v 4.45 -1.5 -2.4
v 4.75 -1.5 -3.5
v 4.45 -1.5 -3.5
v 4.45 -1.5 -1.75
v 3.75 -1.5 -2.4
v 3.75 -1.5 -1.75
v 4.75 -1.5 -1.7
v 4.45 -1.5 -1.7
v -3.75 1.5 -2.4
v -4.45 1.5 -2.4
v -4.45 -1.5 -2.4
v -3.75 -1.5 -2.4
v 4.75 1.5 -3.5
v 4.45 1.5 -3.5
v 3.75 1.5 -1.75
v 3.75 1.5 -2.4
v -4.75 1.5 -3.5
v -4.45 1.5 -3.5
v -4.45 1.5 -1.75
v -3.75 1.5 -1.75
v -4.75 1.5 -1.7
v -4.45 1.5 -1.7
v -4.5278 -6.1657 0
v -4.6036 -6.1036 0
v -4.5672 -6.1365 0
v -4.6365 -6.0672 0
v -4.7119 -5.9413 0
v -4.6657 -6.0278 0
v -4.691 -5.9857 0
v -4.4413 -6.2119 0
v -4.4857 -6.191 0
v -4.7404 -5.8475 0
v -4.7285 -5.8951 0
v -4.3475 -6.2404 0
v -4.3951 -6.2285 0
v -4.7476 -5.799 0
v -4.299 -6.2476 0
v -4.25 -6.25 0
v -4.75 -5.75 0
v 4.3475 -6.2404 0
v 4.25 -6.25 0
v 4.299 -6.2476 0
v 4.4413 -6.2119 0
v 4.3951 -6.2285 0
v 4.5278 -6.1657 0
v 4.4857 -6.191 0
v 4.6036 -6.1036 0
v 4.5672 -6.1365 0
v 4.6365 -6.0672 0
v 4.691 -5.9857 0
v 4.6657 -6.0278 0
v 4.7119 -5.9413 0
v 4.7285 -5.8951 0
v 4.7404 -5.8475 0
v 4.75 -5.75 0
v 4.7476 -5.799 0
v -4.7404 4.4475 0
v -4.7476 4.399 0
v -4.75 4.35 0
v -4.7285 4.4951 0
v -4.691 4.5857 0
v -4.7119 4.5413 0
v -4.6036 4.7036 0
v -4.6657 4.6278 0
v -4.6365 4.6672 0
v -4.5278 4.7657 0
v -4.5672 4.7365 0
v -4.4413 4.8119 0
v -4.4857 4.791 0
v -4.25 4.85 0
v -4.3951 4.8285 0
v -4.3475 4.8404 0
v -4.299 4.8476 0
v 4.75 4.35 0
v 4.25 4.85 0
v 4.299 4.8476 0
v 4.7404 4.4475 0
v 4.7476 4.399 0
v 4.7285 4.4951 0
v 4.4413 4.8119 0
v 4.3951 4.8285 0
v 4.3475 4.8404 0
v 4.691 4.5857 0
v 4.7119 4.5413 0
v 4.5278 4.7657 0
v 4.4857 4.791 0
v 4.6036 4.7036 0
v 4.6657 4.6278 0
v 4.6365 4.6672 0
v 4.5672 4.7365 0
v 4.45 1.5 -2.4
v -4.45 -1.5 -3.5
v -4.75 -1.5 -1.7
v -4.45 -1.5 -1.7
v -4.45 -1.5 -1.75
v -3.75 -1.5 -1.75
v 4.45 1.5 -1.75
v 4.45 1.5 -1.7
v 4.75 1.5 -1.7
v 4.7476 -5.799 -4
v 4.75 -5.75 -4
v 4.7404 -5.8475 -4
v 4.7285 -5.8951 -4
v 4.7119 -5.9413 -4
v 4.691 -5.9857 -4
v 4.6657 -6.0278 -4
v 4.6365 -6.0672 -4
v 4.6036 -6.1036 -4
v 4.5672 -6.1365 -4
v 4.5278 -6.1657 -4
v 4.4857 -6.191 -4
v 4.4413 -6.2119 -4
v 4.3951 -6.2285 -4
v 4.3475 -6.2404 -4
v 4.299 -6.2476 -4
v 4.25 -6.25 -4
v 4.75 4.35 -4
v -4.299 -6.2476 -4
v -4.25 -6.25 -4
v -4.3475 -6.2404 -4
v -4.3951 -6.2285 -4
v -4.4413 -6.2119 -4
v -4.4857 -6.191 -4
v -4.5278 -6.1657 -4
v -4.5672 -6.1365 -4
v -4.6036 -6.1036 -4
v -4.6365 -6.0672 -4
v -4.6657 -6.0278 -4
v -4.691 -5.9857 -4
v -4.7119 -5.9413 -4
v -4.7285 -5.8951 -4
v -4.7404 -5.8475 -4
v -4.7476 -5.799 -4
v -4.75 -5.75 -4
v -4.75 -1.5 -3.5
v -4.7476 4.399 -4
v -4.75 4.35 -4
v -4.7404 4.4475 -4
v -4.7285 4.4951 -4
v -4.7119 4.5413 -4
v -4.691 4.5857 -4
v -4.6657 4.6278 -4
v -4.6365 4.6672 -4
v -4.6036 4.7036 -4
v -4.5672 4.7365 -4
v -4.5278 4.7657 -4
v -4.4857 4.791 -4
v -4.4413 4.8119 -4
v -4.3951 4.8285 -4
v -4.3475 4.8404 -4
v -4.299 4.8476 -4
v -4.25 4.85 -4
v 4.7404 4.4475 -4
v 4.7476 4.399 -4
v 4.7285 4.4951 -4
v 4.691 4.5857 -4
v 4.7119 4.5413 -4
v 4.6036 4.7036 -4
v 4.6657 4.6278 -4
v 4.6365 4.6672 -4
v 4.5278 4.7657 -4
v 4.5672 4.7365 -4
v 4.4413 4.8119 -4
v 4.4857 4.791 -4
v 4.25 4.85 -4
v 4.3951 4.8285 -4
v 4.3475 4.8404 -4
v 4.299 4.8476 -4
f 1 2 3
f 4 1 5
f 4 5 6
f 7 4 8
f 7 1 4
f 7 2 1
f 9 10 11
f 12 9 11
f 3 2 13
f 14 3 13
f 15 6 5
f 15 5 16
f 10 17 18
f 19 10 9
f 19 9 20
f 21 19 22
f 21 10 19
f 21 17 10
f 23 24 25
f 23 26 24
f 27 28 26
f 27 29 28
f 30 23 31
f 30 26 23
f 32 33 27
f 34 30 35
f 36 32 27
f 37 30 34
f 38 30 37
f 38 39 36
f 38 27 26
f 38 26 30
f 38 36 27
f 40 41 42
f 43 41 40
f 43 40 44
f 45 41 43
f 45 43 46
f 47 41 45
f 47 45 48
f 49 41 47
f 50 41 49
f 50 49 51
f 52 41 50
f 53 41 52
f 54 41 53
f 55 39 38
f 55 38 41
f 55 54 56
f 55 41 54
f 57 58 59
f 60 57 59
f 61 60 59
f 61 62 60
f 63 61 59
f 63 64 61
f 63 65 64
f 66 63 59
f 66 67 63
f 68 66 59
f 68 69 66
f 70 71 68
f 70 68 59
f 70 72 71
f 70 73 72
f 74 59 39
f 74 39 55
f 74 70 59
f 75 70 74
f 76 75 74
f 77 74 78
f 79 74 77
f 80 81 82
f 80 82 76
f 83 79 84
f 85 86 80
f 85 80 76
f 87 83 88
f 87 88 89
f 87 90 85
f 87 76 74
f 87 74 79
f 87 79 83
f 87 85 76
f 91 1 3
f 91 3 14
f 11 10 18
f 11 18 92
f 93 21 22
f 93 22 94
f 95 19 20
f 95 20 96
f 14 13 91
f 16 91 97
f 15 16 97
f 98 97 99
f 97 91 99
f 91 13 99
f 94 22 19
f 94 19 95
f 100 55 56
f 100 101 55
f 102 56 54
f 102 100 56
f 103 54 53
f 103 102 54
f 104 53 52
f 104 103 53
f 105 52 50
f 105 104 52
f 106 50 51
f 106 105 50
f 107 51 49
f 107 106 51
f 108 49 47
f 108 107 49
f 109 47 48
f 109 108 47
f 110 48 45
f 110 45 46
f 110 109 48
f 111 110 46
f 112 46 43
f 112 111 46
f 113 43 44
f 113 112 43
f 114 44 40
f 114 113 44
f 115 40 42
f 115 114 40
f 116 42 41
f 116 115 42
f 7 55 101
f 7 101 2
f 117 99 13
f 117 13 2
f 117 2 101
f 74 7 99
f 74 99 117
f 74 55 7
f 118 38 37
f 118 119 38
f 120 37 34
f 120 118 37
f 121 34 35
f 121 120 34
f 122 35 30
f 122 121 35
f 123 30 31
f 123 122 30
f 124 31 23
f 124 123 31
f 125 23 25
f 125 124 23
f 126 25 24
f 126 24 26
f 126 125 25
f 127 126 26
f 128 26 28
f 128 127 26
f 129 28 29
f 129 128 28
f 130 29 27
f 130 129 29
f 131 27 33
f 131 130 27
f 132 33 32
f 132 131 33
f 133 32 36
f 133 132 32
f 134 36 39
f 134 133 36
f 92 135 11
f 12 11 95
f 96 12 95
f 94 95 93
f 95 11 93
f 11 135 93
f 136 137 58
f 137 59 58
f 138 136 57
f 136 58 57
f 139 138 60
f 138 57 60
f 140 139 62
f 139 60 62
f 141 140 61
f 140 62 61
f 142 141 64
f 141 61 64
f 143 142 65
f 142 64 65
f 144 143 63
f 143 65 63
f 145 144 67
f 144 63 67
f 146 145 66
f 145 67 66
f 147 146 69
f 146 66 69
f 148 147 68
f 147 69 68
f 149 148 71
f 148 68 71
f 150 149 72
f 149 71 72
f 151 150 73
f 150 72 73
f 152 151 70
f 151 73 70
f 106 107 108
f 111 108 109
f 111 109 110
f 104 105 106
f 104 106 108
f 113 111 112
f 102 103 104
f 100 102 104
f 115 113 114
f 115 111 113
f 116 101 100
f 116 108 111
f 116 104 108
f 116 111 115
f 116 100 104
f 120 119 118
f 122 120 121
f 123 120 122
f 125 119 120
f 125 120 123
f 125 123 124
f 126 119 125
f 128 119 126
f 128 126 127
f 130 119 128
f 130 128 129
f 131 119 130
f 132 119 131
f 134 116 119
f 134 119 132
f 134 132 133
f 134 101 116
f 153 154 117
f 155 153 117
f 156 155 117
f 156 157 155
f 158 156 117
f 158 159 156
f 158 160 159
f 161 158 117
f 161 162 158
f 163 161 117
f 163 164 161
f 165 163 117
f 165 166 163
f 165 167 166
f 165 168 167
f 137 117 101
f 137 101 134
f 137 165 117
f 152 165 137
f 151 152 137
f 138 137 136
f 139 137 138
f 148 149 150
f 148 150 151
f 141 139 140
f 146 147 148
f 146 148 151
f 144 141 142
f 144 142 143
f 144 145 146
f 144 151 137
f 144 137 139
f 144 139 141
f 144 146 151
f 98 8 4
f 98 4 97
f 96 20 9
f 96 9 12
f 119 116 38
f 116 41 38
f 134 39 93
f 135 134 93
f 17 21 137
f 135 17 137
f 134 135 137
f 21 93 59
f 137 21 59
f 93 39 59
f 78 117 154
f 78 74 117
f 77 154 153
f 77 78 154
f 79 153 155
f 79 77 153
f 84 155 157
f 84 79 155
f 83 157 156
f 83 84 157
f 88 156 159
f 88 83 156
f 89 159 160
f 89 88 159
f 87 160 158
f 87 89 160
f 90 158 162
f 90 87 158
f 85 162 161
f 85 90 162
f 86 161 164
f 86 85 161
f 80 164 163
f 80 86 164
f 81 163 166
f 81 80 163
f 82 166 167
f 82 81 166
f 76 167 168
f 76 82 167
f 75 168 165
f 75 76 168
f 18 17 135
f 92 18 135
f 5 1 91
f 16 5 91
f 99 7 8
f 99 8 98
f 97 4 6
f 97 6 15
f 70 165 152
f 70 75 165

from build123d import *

# Parameters (mm, degrees)
SKETCH006_W     = 9.5
SKETCH006_H     = 11.1
PAD004_DEPTH    = 3.5
SKETCH013_W     = 3
SKETCH013_H     = 0.65
POCKET005_DEPTH = 1
SKETCH014_W     = 9.5
SKETCH014_H     = 11.1
PAD007_DEPTH    = 0.5
FILLET007_R     = 0.5
SKETCH019_W     = 3
SKETCH019_H     = 0.65
POCKET006_DEPTH = 1
SKETCH020_W     = 3
SKETCH020_H     = 1.8
POCKET007_DEPTH = 0.3
SKETCH021_W     = 3
SKETCH021_H     = 1.8
POCKET008_DEPTH = 0.3


with BuildPart() as part:
    # Sketch006 → Pad004 (new body)
    with BuildSketch(Plane.XY):
        with Locations((0, -0.7)):
            Rectangle(SKETCH006_W, SKETCH006_H)
    extrude(amount=-PAD004_DEPTH)

    # Sketch013 (on Face4 of Pad004) → Pocket005 (cut)
    with BuildSketch(Plane.YZ.offset(4.75)):
        with Locations((0, -2.075)):
            Rectangle(SKETCH013_W, SKETCH013_H)
    extrude(amount=-POCKET005_DEPTH, mode=Mode.SUBTRACT)

    # Sketch014 (on Face5 of Pocket005) → Pad007 (join)
    with BuildSketch(Plane(origin=(0, 0, -3.5), x_dir=(-1, 0, 0), z_dir=(0, 0, -1))):
        with Locations((0, -0.7)):
            Rectangle(SKETCH014_W, SKETCH014_H)
    extrude(amount=PAD007_DEPTH)

    # Fillet007
    fillet007_edges = [part.edges().sort_by_distance(p)[0] for p in [
        (4.75, -6.25, -3.75),
        (-4.75, -6.25, -3.75),
        (4.75, 4.85, -3.75),
        (-4.75, 4.85, -3.75),
    ]]
    fillet(fillet007_edges, radius=FILLET007_R)

    # Sketch019 (on Face7 of Fillet007) → Pocket006 (cut)
    with BuildSketch(Plane(origin=(-4.75, 0, 0), x_dir=(0, -1, 0), z_dir=(-1, 0, 0))):
        with Locations((0, -2.075)):
            Rectangle(SKETCH019_W, SKETCH019_H)
    extrude(amount=-POCKET006_DEPTH, mode=Mode.SUBTRACT)

    # Sketch020 (on Face6 of Pocket006) → Pocket007 (cut)
    with BuildSketch(Plane.YZ.offset(4.75)):
        with Locations((0, -2.6)):
            Rectangle(SKETCH020_W, SKETCH020_H)
    extrude(amount=-POCKET007_DEPTH, mode=Mode.SUBTRACT)

    # Sketch021 (on Face7 of Pocket007) → Pocket008 (cut)
    with BuildSketch(Plane(origin=(-4.75, 0, 0), x_dir=(0, -1, 0), z_dir=(-1, 0, 0))):
        with Locations((0, -2.6)):
            Rectangle(SKETCH021_W, SKETCH021_H)
    extrude(amount=-POCKET008_DEPTH, mode=Mode.SUBTRACT)


solid = part.part
